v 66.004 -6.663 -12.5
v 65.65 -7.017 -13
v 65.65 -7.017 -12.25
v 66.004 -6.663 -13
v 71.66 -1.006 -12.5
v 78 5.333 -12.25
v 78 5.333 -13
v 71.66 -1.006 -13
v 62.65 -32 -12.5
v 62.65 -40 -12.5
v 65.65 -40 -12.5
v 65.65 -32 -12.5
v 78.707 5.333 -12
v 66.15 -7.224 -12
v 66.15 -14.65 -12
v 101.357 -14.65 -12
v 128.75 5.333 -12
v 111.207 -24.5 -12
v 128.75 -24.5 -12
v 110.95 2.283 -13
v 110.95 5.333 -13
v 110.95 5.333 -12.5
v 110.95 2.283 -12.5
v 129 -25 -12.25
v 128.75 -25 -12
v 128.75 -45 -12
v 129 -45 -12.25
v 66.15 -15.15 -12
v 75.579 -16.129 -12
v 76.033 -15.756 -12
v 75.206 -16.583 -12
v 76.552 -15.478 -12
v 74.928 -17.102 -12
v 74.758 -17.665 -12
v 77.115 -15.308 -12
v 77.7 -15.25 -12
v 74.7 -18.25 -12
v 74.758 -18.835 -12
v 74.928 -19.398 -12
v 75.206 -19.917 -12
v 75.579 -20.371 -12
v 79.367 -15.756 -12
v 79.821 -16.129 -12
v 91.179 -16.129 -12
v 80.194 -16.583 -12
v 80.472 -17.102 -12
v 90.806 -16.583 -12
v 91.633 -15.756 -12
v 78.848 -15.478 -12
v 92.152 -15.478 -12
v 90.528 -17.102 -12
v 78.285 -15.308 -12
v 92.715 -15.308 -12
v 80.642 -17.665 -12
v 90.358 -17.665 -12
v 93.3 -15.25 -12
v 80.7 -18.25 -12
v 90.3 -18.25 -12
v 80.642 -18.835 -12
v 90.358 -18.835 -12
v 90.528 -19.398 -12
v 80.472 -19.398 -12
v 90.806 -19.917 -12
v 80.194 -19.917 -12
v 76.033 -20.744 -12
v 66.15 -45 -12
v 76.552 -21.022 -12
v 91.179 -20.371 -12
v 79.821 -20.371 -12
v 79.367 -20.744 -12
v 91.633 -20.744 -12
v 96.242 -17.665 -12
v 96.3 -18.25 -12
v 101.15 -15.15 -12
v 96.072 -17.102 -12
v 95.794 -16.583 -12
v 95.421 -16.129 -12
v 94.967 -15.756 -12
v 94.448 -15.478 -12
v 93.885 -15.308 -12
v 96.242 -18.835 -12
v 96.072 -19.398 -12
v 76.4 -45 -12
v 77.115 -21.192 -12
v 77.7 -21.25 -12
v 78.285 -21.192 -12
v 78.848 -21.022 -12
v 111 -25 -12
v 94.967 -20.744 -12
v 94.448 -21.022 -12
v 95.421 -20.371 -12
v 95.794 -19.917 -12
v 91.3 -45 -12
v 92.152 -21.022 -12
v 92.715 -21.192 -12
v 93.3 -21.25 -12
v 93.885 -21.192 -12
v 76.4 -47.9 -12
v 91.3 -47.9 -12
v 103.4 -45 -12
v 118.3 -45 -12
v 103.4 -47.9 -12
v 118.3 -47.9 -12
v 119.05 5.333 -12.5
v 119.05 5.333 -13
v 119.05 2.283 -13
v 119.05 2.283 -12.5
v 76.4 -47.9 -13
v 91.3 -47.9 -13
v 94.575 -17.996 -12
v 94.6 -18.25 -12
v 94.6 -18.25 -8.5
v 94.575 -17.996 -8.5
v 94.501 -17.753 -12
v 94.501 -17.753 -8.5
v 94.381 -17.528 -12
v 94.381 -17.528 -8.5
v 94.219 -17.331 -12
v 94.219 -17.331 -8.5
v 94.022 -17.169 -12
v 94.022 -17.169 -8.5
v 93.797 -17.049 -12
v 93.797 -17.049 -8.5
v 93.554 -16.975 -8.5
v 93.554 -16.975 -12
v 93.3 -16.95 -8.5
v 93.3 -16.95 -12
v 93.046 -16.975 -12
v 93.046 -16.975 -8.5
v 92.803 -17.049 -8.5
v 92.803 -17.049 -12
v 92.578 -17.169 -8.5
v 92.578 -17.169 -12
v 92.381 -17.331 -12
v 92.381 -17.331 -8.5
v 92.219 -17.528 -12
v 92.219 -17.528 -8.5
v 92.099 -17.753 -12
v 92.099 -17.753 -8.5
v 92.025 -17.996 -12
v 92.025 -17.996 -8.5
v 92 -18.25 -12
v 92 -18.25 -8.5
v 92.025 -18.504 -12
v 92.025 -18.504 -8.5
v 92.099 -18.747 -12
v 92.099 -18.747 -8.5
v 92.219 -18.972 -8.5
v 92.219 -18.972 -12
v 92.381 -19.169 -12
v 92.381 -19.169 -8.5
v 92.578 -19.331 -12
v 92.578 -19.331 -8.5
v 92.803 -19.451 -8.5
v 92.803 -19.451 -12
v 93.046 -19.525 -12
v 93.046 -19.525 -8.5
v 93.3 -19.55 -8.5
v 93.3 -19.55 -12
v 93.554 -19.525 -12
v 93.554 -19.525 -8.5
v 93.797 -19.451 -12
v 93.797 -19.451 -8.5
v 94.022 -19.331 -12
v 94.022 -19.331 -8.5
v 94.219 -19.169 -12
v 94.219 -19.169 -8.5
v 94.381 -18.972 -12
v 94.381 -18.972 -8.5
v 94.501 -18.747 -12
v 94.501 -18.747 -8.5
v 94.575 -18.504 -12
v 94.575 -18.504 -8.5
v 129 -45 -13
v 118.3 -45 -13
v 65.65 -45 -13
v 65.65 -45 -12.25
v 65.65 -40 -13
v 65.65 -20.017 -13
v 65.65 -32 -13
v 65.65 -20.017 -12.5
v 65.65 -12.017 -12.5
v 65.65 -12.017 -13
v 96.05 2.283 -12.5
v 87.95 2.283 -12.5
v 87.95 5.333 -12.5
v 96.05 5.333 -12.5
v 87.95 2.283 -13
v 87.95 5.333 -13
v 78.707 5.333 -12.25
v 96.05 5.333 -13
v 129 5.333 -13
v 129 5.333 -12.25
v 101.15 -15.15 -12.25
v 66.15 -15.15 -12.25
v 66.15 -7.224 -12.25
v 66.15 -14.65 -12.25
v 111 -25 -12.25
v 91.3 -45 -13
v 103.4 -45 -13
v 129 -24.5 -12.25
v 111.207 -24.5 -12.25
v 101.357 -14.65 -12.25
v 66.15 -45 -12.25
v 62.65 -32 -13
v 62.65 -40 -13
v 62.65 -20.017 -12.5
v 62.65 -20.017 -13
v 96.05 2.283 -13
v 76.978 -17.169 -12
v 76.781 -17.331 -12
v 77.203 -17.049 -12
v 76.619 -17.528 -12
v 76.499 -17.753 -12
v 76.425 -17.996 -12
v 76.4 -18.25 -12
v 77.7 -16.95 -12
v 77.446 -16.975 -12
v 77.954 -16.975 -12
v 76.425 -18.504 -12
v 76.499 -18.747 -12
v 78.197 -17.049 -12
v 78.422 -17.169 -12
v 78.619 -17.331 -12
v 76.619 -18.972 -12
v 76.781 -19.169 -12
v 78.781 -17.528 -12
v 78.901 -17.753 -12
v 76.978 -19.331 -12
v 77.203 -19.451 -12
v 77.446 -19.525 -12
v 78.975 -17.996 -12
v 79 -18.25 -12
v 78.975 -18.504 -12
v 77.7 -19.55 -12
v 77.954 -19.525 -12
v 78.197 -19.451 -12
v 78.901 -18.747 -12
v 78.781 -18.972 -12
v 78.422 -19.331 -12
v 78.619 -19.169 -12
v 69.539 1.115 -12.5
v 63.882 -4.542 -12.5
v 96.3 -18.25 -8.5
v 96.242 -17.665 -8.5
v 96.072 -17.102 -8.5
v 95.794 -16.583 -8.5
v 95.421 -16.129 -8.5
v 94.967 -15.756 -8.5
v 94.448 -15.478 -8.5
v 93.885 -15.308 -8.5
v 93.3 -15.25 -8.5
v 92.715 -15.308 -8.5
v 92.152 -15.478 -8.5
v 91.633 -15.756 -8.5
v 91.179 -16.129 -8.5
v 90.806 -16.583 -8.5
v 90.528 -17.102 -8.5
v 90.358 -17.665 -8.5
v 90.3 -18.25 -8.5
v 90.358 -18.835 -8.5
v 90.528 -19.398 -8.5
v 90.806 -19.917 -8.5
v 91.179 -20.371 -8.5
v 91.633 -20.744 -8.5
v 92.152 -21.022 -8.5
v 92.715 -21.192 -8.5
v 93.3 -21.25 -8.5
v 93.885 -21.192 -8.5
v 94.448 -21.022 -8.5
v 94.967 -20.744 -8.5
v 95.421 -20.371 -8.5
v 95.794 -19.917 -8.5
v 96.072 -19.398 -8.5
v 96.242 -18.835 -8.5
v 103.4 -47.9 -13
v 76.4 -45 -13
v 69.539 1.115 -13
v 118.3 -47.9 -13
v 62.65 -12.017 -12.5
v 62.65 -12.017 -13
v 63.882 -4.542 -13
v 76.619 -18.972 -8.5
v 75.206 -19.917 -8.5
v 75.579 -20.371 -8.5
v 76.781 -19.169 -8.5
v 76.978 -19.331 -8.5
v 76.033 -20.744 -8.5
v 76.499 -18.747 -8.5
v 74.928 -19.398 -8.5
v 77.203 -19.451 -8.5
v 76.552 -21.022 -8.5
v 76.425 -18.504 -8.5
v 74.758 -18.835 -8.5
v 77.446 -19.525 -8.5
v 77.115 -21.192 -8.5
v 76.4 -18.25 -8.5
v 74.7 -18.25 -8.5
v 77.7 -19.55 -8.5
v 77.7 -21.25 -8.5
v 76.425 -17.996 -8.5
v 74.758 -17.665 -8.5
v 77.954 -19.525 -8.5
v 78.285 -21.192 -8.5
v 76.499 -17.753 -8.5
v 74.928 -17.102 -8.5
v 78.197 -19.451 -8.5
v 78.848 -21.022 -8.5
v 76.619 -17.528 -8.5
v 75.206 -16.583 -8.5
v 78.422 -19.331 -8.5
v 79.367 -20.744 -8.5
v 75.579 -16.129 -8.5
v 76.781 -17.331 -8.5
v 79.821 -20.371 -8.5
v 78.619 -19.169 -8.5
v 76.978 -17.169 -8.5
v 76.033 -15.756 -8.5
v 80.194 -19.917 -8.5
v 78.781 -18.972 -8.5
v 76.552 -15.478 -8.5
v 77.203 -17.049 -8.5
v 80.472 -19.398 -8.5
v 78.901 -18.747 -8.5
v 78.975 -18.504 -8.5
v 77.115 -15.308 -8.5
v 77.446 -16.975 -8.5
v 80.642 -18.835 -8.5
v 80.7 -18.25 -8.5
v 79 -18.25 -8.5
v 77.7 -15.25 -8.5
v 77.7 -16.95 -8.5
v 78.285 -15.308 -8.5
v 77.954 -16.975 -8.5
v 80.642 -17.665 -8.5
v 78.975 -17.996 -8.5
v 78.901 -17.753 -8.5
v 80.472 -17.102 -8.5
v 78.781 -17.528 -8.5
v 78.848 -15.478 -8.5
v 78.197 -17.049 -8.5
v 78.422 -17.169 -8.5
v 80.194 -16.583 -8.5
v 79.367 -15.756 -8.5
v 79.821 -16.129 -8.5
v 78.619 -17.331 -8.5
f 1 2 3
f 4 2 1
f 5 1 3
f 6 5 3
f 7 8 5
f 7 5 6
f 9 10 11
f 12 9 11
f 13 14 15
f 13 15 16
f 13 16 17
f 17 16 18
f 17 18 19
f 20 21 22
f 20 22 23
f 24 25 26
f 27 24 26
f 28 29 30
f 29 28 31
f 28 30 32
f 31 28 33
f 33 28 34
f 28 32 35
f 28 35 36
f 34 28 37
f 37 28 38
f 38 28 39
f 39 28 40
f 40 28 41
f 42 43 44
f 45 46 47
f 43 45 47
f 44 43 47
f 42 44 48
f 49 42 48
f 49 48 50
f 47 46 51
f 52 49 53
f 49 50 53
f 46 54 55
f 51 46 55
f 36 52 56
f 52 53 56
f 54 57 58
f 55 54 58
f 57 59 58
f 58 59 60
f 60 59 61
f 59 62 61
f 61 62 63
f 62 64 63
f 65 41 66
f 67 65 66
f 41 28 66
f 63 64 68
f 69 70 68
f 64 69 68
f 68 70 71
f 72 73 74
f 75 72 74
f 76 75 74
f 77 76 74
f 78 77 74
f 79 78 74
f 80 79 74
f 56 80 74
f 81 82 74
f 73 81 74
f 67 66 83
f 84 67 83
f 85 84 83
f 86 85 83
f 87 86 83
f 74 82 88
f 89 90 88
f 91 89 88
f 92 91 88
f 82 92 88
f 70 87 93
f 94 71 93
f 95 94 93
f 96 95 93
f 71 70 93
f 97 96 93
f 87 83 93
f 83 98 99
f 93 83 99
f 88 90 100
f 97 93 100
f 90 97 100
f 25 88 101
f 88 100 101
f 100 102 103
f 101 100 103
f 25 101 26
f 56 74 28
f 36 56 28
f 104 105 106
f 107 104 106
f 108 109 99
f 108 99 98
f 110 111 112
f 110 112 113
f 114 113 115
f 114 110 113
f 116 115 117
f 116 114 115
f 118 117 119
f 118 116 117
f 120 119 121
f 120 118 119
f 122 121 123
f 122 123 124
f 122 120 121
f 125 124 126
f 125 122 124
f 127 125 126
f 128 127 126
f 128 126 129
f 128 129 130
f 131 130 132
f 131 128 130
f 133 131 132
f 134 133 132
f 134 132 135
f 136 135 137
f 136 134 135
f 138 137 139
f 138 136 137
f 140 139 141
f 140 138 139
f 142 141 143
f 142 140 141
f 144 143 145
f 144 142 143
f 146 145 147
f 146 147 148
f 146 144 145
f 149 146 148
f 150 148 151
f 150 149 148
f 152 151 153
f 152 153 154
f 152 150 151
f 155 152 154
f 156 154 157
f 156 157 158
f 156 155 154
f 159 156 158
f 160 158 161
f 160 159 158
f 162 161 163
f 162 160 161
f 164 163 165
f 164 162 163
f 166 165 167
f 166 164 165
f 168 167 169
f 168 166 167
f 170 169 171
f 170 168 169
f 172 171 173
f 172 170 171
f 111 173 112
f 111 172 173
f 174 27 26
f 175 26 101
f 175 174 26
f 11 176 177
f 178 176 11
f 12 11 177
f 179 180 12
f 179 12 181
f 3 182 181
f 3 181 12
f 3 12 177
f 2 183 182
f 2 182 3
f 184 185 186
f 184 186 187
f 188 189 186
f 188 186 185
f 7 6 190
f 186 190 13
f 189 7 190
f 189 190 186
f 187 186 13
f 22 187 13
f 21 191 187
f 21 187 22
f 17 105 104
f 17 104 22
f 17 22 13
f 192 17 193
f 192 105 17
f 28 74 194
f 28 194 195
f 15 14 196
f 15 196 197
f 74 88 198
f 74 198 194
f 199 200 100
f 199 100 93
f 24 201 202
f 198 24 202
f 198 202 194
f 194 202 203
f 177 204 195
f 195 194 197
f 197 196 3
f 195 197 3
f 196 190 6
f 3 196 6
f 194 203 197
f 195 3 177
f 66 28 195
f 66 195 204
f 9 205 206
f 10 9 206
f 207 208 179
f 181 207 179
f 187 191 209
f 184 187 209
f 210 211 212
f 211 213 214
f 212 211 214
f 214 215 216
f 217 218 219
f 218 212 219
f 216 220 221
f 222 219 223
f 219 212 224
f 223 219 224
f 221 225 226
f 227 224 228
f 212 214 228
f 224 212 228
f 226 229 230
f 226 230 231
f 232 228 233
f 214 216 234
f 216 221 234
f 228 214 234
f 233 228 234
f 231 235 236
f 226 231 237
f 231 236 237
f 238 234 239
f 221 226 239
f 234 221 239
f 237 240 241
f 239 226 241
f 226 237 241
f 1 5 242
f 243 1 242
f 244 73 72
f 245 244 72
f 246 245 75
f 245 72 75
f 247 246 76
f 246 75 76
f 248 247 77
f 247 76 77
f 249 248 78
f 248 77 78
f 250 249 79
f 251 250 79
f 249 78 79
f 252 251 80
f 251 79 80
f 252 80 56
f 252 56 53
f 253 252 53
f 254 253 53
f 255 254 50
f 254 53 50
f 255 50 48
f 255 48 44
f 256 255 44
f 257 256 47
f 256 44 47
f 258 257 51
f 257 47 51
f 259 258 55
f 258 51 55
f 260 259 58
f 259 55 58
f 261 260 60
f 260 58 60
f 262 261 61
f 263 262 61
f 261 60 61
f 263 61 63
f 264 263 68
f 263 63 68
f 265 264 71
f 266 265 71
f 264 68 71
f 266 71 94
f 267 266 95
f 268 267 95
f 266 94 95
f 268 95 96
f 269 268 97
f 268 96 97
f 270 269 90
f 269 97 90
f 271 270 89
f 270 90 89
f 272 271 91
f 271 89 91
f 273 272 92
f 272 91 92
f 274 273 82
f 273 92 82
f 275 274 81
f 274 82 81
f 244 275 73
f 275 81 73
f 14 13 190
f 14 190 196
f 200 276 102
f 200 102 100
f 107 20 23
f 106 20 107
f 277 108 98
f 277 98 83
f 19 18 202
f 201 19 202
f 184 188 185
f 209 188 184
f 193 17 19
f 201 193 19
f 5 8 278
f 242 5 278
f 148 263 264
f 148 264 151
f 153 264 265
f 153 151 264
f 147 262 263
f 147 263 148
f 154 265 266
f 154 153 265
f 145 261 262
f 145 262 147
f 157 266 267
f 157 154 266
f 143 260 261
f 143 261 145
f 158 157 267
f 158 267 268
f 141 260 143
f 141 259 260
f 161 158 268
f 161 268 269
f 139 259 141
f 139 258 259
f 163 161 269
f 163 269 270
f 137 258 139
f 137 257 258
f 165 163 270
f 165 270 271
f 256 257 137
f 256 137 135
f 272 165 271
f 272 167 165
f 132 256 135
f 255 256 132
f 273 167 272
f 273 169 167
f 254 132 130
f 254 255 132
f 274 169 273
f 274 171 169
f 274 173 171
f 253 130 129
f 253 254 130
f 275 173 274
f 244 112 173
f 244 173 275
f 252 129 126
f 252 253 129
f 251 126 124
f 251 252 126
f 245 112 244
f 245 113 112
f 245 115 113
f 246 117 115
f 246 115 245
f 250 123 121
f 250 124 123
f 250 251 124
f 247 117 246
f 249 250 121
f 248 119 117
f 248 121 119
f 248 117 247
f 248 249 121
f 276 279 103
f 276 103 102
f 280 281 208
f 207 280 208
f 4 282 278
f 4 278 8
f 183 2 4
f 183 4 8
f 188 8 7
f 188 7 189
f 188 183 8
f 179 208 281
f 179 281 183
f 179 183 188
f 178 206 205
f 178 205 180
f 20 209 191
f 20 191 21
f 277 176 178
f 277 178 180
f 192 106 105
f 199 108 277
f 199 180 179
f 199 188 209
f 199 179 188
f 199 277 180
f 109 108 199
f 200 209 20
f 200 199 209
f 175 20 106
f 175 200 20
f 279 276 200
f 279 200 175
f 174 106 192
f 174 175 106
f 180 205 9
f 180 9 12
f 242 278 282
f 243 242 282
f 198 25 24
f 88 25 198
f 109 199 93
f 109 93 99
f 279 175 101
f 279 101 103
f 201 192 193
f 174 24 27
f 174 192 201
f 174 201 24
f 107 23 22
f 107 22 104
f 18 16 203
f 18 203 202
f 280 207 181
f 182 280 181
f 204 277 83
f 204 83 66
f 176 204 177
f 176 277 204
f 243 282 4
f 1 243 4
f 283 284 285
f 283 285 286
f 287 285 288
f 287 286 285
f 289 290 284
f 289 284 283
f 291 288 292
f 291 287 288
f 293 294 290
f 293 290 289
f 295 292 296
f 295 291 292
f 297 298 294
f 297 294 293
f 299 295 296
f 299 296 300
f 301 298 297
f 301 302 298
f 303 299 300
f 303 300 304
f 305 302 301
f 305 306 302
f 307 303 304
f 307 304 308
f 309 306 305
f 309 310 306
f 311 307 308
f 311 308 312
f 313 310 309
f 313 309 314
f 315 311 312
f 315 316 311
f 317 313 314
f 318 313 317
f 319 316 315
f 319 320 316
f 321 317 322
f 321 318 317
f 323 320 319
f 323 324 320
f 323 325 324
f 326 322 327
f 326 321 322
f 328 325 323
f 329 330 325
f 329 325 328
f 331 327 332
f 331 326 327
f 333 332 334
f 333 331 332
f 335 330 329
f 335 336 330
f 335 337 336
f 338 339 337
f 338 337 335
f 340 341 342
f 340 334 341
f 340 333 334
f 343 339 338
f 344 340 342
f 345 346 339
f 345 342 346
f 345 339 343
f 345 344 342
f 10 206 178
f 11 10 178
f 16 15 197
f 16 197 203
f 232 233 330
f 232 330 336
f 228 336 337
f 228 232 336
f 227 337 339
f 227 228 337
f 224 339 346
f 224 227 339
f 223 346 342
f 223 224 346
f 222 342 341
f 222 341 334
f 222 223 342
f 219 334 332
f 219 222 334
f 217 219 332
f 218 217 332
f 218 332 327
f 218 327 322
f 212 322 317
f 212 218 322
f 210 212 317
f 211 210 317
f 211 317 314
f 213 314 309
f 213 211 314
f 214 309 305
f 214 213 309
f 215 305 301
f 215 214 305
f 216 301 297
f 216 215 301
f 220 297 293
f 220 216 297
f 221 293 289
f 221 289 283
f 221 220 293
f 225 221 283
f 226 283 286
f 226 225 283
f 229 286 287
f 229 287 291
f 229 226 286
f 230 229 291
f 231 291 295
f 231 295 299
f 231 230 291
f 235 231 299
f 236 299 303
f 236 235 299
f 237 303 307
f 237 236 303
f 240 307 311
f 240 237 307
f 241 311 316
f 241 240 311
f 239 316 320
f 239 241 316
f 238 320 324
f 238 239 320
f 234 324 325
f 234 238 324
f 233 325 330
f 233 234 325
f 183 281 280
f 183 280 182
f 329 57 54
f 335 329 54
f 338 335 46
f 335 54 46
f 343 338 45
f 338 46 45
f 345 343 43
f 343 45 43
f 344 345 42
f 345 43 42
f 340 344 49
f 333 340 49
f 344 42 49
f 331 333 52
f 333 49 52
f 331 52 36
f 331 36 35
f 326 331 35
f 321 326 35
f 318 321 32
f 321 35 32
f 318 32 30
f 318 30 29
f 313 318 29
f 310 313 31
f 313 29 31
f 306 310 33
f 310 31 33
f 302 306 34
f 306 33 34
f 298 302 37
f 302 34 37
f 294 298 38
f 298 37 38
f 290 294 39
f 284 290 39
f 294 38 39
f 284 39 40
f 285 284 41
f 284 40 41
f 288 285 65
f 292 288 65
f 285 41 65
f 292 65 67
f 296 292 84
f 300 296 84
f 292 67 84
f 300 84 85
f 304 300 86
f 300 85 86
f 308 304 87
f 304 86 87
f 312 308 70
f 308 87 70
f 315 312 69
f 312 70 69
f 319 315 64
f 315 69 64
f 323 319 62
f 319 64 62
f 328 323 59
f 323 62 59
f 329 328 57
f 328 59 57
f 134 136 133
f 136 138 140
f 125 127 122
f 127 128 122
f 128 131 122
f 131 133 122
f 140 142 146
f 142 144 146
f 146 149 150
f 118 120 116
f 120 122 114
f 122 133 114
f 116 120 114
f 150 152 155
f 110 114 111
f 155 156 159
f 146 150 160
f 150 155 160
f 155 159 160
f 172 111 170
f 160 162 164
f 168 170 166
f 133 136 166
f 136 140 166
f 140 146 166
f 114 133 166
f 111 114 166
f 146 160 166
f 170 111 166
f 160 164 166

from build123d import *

# Parameters (mm, degrees)
PAD030_DEPTH    = 1
SKETCH049_W     = 8.1
SKETCH049_H     = 3.05
POCKET019_DEPTH = 0.5
POCKET020_DEPTH = 0.25
POCKET021_DEPTH = 0.25
CHAMFER008_SIZE = 0.25
SKETCH052_W     = 3
SKETCH052_H     = 8
PAD031_DEPTH    = 0.5
SKETCH053_R     = 3
SKETCH053_R_2   = 1.3
PAD032_DEPTH    = 3.5


with BuildPart() as part:
    # Sketch048 (on Face2 of Binder014) → Pad030 (new body)
    with BuildSketch(Plane(origin=(0, 0, -13), x_dir=(1, 0, 0), z_dir=(0, 0, -1))):
        Polygon((129, -5.333333), (129, 44.999997), (118.3, 44.999997), (118.3, 47.899997), (103.4, 47.899997), (103.4, 44.999997), (91.3, 44.999997), (91.3, 47.899997), (76.4, 47.899997), (76.4, 44.999997), (65.65, 44.999997), (65.65, 7.016667), (78, -5.333333), align=None)
    extrude(amount=-PAD030_DEPTH)

    # Sketch049 (on Face14 of Pad030) → Pocket019 (cut)
    with BuildSketch(Plane(origin=(0, 0, -13), x_dir=(1, 0, 0), z_dir=(0, 0, -1))):
        with Locations((92, -3.808333)):
            Rectangle(SKETCH049_W, SKETCH049_H)
        with Locations((115, -3.808333)):
            Rectangle(SKETCH049_W, SKETCH049_H)
    extrude(amount=-POCKET019_DEPTH, mode=Mode.SUBTRACT)

    # Sketch050 (on Face5 of Pocket019) → Pocket020 (cut)
    with BuildSketch(Plane.XY.offset(-12)):
        Polygon((78, 5.333333), (78.7071067812, 5.333333), (66.15, -7.2237737812), (66.15, -44.999997), (65.65, -44.999997), (65.65, -7.016667), align=None)
    extrude(amount=-POCKET020_DEPTH, mode=Mode.SUBTRACT)

    # Sketch051 (on Face5 of Pocket020) → Pocket021 (cut)
    with BuildSketch(Plane.XY.offset(-12)):
        Polygon((66.15, -14.649997), (101.3571067812, -14.649997), (111.2071067812, -24.499997), (129, -24.499997), (129, -24.999997), (111, -24.999997), (101.15, -15.149997), (66.15, -15.149997), align=None)
    extrude(amount=-POCKET021_DEPTH, mode=Mode.SUBTRACT)

    # Chamfer008
    chamfer008_edges = [part.edges().sort_by_distance(p)[0] for p in [
        (129, -9.583332, -12),
        (129, -34.999997, -12),
    ]]
    chamfer(chamfer008_edges, length=CHAMFER008_SIZE)

    # Sketch052 (on Face4 of Chamfer008) → Pad031 (join)
    with BuildSketch(Plane(origin=(0, 0, -13), x_dir=(1, 0, 0), z_dir=(0, 0, -1))):
        Polygon((66.0035533906, 6.6631136094), (71.6604076401, 1.0062593599), (69.5390872965, -1.1150609836), (63.882233047, 4.5417932658), align=None)
        with Locations((64.15, 16.016667)):
            Rectangle(SKETCH052_W, SKETCH052_H)
        with Locations((64.15, 35.999997)):
            Rectangle(SKETCH052_W, SKETCH052_H)
    extrude(amount=-PAD031_DEPTH)

    # Sketch053 (on Face7 of Pad031) → Pad032 (join)
    with BuildSketch(Plane.XY.offset(-12)):
        with Locations((77.7, -18.249997)):
            Circle(SKETCH053_R)
        with Locations((77.7, -18.249997)):
            Circle(SKETCH053_R_2, mode=Mode.SUBTRACT)
        with Locations((93.3, -18.249997)):
            Circle(SKETCH053_R)
        with Locations((93.3, -18.249997)):
            Circle(SKETCH053_R_2, mode=Mode.SUBTRACT)
    extrude(amount=PAD032_DEPTH)


solid = part.part
